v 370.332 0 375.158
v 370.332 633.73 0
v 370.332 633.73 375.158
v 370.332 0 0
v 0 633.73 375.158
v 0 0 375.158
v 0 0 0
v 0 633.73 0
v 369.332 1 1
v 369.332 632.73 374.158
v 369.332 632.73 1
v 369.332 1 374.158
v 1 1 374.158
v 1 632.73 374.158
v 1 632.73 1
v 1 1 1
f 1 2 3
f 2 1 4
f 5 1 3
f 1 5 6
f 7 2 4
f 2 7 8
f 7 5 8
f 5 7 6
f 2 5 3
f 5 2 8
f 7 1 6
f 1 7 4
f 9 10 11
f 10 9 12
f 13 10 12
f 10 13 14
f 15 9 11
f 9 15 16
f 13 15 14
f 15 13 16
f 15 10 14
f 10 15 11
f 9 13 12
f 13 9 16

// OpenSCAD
// Igloo Profile II Cooler, 50 qt
// Dimensions 14.58" W x 24.95" L x 14.77" H
inch = 25.4;
cooler_width  = 14.58 * inch;
cooler_length = 24.95 * inch;
cooler_height = 14.77 * inch;

module cooler(x,y,z) {
    translate([x,y,z]) difference() {
        // Outer cube (solid)
        cube([cooler_width, cooler_length, cooler_height], center=false);
    
        // Inner holow cutout (subtracts from outer)
        translate([1, 1,  1])
            cube([cooler_width - 2, cooler_length - 2, cooler_height - 2], center=false);
    }
}

cooler(0,0,0);
